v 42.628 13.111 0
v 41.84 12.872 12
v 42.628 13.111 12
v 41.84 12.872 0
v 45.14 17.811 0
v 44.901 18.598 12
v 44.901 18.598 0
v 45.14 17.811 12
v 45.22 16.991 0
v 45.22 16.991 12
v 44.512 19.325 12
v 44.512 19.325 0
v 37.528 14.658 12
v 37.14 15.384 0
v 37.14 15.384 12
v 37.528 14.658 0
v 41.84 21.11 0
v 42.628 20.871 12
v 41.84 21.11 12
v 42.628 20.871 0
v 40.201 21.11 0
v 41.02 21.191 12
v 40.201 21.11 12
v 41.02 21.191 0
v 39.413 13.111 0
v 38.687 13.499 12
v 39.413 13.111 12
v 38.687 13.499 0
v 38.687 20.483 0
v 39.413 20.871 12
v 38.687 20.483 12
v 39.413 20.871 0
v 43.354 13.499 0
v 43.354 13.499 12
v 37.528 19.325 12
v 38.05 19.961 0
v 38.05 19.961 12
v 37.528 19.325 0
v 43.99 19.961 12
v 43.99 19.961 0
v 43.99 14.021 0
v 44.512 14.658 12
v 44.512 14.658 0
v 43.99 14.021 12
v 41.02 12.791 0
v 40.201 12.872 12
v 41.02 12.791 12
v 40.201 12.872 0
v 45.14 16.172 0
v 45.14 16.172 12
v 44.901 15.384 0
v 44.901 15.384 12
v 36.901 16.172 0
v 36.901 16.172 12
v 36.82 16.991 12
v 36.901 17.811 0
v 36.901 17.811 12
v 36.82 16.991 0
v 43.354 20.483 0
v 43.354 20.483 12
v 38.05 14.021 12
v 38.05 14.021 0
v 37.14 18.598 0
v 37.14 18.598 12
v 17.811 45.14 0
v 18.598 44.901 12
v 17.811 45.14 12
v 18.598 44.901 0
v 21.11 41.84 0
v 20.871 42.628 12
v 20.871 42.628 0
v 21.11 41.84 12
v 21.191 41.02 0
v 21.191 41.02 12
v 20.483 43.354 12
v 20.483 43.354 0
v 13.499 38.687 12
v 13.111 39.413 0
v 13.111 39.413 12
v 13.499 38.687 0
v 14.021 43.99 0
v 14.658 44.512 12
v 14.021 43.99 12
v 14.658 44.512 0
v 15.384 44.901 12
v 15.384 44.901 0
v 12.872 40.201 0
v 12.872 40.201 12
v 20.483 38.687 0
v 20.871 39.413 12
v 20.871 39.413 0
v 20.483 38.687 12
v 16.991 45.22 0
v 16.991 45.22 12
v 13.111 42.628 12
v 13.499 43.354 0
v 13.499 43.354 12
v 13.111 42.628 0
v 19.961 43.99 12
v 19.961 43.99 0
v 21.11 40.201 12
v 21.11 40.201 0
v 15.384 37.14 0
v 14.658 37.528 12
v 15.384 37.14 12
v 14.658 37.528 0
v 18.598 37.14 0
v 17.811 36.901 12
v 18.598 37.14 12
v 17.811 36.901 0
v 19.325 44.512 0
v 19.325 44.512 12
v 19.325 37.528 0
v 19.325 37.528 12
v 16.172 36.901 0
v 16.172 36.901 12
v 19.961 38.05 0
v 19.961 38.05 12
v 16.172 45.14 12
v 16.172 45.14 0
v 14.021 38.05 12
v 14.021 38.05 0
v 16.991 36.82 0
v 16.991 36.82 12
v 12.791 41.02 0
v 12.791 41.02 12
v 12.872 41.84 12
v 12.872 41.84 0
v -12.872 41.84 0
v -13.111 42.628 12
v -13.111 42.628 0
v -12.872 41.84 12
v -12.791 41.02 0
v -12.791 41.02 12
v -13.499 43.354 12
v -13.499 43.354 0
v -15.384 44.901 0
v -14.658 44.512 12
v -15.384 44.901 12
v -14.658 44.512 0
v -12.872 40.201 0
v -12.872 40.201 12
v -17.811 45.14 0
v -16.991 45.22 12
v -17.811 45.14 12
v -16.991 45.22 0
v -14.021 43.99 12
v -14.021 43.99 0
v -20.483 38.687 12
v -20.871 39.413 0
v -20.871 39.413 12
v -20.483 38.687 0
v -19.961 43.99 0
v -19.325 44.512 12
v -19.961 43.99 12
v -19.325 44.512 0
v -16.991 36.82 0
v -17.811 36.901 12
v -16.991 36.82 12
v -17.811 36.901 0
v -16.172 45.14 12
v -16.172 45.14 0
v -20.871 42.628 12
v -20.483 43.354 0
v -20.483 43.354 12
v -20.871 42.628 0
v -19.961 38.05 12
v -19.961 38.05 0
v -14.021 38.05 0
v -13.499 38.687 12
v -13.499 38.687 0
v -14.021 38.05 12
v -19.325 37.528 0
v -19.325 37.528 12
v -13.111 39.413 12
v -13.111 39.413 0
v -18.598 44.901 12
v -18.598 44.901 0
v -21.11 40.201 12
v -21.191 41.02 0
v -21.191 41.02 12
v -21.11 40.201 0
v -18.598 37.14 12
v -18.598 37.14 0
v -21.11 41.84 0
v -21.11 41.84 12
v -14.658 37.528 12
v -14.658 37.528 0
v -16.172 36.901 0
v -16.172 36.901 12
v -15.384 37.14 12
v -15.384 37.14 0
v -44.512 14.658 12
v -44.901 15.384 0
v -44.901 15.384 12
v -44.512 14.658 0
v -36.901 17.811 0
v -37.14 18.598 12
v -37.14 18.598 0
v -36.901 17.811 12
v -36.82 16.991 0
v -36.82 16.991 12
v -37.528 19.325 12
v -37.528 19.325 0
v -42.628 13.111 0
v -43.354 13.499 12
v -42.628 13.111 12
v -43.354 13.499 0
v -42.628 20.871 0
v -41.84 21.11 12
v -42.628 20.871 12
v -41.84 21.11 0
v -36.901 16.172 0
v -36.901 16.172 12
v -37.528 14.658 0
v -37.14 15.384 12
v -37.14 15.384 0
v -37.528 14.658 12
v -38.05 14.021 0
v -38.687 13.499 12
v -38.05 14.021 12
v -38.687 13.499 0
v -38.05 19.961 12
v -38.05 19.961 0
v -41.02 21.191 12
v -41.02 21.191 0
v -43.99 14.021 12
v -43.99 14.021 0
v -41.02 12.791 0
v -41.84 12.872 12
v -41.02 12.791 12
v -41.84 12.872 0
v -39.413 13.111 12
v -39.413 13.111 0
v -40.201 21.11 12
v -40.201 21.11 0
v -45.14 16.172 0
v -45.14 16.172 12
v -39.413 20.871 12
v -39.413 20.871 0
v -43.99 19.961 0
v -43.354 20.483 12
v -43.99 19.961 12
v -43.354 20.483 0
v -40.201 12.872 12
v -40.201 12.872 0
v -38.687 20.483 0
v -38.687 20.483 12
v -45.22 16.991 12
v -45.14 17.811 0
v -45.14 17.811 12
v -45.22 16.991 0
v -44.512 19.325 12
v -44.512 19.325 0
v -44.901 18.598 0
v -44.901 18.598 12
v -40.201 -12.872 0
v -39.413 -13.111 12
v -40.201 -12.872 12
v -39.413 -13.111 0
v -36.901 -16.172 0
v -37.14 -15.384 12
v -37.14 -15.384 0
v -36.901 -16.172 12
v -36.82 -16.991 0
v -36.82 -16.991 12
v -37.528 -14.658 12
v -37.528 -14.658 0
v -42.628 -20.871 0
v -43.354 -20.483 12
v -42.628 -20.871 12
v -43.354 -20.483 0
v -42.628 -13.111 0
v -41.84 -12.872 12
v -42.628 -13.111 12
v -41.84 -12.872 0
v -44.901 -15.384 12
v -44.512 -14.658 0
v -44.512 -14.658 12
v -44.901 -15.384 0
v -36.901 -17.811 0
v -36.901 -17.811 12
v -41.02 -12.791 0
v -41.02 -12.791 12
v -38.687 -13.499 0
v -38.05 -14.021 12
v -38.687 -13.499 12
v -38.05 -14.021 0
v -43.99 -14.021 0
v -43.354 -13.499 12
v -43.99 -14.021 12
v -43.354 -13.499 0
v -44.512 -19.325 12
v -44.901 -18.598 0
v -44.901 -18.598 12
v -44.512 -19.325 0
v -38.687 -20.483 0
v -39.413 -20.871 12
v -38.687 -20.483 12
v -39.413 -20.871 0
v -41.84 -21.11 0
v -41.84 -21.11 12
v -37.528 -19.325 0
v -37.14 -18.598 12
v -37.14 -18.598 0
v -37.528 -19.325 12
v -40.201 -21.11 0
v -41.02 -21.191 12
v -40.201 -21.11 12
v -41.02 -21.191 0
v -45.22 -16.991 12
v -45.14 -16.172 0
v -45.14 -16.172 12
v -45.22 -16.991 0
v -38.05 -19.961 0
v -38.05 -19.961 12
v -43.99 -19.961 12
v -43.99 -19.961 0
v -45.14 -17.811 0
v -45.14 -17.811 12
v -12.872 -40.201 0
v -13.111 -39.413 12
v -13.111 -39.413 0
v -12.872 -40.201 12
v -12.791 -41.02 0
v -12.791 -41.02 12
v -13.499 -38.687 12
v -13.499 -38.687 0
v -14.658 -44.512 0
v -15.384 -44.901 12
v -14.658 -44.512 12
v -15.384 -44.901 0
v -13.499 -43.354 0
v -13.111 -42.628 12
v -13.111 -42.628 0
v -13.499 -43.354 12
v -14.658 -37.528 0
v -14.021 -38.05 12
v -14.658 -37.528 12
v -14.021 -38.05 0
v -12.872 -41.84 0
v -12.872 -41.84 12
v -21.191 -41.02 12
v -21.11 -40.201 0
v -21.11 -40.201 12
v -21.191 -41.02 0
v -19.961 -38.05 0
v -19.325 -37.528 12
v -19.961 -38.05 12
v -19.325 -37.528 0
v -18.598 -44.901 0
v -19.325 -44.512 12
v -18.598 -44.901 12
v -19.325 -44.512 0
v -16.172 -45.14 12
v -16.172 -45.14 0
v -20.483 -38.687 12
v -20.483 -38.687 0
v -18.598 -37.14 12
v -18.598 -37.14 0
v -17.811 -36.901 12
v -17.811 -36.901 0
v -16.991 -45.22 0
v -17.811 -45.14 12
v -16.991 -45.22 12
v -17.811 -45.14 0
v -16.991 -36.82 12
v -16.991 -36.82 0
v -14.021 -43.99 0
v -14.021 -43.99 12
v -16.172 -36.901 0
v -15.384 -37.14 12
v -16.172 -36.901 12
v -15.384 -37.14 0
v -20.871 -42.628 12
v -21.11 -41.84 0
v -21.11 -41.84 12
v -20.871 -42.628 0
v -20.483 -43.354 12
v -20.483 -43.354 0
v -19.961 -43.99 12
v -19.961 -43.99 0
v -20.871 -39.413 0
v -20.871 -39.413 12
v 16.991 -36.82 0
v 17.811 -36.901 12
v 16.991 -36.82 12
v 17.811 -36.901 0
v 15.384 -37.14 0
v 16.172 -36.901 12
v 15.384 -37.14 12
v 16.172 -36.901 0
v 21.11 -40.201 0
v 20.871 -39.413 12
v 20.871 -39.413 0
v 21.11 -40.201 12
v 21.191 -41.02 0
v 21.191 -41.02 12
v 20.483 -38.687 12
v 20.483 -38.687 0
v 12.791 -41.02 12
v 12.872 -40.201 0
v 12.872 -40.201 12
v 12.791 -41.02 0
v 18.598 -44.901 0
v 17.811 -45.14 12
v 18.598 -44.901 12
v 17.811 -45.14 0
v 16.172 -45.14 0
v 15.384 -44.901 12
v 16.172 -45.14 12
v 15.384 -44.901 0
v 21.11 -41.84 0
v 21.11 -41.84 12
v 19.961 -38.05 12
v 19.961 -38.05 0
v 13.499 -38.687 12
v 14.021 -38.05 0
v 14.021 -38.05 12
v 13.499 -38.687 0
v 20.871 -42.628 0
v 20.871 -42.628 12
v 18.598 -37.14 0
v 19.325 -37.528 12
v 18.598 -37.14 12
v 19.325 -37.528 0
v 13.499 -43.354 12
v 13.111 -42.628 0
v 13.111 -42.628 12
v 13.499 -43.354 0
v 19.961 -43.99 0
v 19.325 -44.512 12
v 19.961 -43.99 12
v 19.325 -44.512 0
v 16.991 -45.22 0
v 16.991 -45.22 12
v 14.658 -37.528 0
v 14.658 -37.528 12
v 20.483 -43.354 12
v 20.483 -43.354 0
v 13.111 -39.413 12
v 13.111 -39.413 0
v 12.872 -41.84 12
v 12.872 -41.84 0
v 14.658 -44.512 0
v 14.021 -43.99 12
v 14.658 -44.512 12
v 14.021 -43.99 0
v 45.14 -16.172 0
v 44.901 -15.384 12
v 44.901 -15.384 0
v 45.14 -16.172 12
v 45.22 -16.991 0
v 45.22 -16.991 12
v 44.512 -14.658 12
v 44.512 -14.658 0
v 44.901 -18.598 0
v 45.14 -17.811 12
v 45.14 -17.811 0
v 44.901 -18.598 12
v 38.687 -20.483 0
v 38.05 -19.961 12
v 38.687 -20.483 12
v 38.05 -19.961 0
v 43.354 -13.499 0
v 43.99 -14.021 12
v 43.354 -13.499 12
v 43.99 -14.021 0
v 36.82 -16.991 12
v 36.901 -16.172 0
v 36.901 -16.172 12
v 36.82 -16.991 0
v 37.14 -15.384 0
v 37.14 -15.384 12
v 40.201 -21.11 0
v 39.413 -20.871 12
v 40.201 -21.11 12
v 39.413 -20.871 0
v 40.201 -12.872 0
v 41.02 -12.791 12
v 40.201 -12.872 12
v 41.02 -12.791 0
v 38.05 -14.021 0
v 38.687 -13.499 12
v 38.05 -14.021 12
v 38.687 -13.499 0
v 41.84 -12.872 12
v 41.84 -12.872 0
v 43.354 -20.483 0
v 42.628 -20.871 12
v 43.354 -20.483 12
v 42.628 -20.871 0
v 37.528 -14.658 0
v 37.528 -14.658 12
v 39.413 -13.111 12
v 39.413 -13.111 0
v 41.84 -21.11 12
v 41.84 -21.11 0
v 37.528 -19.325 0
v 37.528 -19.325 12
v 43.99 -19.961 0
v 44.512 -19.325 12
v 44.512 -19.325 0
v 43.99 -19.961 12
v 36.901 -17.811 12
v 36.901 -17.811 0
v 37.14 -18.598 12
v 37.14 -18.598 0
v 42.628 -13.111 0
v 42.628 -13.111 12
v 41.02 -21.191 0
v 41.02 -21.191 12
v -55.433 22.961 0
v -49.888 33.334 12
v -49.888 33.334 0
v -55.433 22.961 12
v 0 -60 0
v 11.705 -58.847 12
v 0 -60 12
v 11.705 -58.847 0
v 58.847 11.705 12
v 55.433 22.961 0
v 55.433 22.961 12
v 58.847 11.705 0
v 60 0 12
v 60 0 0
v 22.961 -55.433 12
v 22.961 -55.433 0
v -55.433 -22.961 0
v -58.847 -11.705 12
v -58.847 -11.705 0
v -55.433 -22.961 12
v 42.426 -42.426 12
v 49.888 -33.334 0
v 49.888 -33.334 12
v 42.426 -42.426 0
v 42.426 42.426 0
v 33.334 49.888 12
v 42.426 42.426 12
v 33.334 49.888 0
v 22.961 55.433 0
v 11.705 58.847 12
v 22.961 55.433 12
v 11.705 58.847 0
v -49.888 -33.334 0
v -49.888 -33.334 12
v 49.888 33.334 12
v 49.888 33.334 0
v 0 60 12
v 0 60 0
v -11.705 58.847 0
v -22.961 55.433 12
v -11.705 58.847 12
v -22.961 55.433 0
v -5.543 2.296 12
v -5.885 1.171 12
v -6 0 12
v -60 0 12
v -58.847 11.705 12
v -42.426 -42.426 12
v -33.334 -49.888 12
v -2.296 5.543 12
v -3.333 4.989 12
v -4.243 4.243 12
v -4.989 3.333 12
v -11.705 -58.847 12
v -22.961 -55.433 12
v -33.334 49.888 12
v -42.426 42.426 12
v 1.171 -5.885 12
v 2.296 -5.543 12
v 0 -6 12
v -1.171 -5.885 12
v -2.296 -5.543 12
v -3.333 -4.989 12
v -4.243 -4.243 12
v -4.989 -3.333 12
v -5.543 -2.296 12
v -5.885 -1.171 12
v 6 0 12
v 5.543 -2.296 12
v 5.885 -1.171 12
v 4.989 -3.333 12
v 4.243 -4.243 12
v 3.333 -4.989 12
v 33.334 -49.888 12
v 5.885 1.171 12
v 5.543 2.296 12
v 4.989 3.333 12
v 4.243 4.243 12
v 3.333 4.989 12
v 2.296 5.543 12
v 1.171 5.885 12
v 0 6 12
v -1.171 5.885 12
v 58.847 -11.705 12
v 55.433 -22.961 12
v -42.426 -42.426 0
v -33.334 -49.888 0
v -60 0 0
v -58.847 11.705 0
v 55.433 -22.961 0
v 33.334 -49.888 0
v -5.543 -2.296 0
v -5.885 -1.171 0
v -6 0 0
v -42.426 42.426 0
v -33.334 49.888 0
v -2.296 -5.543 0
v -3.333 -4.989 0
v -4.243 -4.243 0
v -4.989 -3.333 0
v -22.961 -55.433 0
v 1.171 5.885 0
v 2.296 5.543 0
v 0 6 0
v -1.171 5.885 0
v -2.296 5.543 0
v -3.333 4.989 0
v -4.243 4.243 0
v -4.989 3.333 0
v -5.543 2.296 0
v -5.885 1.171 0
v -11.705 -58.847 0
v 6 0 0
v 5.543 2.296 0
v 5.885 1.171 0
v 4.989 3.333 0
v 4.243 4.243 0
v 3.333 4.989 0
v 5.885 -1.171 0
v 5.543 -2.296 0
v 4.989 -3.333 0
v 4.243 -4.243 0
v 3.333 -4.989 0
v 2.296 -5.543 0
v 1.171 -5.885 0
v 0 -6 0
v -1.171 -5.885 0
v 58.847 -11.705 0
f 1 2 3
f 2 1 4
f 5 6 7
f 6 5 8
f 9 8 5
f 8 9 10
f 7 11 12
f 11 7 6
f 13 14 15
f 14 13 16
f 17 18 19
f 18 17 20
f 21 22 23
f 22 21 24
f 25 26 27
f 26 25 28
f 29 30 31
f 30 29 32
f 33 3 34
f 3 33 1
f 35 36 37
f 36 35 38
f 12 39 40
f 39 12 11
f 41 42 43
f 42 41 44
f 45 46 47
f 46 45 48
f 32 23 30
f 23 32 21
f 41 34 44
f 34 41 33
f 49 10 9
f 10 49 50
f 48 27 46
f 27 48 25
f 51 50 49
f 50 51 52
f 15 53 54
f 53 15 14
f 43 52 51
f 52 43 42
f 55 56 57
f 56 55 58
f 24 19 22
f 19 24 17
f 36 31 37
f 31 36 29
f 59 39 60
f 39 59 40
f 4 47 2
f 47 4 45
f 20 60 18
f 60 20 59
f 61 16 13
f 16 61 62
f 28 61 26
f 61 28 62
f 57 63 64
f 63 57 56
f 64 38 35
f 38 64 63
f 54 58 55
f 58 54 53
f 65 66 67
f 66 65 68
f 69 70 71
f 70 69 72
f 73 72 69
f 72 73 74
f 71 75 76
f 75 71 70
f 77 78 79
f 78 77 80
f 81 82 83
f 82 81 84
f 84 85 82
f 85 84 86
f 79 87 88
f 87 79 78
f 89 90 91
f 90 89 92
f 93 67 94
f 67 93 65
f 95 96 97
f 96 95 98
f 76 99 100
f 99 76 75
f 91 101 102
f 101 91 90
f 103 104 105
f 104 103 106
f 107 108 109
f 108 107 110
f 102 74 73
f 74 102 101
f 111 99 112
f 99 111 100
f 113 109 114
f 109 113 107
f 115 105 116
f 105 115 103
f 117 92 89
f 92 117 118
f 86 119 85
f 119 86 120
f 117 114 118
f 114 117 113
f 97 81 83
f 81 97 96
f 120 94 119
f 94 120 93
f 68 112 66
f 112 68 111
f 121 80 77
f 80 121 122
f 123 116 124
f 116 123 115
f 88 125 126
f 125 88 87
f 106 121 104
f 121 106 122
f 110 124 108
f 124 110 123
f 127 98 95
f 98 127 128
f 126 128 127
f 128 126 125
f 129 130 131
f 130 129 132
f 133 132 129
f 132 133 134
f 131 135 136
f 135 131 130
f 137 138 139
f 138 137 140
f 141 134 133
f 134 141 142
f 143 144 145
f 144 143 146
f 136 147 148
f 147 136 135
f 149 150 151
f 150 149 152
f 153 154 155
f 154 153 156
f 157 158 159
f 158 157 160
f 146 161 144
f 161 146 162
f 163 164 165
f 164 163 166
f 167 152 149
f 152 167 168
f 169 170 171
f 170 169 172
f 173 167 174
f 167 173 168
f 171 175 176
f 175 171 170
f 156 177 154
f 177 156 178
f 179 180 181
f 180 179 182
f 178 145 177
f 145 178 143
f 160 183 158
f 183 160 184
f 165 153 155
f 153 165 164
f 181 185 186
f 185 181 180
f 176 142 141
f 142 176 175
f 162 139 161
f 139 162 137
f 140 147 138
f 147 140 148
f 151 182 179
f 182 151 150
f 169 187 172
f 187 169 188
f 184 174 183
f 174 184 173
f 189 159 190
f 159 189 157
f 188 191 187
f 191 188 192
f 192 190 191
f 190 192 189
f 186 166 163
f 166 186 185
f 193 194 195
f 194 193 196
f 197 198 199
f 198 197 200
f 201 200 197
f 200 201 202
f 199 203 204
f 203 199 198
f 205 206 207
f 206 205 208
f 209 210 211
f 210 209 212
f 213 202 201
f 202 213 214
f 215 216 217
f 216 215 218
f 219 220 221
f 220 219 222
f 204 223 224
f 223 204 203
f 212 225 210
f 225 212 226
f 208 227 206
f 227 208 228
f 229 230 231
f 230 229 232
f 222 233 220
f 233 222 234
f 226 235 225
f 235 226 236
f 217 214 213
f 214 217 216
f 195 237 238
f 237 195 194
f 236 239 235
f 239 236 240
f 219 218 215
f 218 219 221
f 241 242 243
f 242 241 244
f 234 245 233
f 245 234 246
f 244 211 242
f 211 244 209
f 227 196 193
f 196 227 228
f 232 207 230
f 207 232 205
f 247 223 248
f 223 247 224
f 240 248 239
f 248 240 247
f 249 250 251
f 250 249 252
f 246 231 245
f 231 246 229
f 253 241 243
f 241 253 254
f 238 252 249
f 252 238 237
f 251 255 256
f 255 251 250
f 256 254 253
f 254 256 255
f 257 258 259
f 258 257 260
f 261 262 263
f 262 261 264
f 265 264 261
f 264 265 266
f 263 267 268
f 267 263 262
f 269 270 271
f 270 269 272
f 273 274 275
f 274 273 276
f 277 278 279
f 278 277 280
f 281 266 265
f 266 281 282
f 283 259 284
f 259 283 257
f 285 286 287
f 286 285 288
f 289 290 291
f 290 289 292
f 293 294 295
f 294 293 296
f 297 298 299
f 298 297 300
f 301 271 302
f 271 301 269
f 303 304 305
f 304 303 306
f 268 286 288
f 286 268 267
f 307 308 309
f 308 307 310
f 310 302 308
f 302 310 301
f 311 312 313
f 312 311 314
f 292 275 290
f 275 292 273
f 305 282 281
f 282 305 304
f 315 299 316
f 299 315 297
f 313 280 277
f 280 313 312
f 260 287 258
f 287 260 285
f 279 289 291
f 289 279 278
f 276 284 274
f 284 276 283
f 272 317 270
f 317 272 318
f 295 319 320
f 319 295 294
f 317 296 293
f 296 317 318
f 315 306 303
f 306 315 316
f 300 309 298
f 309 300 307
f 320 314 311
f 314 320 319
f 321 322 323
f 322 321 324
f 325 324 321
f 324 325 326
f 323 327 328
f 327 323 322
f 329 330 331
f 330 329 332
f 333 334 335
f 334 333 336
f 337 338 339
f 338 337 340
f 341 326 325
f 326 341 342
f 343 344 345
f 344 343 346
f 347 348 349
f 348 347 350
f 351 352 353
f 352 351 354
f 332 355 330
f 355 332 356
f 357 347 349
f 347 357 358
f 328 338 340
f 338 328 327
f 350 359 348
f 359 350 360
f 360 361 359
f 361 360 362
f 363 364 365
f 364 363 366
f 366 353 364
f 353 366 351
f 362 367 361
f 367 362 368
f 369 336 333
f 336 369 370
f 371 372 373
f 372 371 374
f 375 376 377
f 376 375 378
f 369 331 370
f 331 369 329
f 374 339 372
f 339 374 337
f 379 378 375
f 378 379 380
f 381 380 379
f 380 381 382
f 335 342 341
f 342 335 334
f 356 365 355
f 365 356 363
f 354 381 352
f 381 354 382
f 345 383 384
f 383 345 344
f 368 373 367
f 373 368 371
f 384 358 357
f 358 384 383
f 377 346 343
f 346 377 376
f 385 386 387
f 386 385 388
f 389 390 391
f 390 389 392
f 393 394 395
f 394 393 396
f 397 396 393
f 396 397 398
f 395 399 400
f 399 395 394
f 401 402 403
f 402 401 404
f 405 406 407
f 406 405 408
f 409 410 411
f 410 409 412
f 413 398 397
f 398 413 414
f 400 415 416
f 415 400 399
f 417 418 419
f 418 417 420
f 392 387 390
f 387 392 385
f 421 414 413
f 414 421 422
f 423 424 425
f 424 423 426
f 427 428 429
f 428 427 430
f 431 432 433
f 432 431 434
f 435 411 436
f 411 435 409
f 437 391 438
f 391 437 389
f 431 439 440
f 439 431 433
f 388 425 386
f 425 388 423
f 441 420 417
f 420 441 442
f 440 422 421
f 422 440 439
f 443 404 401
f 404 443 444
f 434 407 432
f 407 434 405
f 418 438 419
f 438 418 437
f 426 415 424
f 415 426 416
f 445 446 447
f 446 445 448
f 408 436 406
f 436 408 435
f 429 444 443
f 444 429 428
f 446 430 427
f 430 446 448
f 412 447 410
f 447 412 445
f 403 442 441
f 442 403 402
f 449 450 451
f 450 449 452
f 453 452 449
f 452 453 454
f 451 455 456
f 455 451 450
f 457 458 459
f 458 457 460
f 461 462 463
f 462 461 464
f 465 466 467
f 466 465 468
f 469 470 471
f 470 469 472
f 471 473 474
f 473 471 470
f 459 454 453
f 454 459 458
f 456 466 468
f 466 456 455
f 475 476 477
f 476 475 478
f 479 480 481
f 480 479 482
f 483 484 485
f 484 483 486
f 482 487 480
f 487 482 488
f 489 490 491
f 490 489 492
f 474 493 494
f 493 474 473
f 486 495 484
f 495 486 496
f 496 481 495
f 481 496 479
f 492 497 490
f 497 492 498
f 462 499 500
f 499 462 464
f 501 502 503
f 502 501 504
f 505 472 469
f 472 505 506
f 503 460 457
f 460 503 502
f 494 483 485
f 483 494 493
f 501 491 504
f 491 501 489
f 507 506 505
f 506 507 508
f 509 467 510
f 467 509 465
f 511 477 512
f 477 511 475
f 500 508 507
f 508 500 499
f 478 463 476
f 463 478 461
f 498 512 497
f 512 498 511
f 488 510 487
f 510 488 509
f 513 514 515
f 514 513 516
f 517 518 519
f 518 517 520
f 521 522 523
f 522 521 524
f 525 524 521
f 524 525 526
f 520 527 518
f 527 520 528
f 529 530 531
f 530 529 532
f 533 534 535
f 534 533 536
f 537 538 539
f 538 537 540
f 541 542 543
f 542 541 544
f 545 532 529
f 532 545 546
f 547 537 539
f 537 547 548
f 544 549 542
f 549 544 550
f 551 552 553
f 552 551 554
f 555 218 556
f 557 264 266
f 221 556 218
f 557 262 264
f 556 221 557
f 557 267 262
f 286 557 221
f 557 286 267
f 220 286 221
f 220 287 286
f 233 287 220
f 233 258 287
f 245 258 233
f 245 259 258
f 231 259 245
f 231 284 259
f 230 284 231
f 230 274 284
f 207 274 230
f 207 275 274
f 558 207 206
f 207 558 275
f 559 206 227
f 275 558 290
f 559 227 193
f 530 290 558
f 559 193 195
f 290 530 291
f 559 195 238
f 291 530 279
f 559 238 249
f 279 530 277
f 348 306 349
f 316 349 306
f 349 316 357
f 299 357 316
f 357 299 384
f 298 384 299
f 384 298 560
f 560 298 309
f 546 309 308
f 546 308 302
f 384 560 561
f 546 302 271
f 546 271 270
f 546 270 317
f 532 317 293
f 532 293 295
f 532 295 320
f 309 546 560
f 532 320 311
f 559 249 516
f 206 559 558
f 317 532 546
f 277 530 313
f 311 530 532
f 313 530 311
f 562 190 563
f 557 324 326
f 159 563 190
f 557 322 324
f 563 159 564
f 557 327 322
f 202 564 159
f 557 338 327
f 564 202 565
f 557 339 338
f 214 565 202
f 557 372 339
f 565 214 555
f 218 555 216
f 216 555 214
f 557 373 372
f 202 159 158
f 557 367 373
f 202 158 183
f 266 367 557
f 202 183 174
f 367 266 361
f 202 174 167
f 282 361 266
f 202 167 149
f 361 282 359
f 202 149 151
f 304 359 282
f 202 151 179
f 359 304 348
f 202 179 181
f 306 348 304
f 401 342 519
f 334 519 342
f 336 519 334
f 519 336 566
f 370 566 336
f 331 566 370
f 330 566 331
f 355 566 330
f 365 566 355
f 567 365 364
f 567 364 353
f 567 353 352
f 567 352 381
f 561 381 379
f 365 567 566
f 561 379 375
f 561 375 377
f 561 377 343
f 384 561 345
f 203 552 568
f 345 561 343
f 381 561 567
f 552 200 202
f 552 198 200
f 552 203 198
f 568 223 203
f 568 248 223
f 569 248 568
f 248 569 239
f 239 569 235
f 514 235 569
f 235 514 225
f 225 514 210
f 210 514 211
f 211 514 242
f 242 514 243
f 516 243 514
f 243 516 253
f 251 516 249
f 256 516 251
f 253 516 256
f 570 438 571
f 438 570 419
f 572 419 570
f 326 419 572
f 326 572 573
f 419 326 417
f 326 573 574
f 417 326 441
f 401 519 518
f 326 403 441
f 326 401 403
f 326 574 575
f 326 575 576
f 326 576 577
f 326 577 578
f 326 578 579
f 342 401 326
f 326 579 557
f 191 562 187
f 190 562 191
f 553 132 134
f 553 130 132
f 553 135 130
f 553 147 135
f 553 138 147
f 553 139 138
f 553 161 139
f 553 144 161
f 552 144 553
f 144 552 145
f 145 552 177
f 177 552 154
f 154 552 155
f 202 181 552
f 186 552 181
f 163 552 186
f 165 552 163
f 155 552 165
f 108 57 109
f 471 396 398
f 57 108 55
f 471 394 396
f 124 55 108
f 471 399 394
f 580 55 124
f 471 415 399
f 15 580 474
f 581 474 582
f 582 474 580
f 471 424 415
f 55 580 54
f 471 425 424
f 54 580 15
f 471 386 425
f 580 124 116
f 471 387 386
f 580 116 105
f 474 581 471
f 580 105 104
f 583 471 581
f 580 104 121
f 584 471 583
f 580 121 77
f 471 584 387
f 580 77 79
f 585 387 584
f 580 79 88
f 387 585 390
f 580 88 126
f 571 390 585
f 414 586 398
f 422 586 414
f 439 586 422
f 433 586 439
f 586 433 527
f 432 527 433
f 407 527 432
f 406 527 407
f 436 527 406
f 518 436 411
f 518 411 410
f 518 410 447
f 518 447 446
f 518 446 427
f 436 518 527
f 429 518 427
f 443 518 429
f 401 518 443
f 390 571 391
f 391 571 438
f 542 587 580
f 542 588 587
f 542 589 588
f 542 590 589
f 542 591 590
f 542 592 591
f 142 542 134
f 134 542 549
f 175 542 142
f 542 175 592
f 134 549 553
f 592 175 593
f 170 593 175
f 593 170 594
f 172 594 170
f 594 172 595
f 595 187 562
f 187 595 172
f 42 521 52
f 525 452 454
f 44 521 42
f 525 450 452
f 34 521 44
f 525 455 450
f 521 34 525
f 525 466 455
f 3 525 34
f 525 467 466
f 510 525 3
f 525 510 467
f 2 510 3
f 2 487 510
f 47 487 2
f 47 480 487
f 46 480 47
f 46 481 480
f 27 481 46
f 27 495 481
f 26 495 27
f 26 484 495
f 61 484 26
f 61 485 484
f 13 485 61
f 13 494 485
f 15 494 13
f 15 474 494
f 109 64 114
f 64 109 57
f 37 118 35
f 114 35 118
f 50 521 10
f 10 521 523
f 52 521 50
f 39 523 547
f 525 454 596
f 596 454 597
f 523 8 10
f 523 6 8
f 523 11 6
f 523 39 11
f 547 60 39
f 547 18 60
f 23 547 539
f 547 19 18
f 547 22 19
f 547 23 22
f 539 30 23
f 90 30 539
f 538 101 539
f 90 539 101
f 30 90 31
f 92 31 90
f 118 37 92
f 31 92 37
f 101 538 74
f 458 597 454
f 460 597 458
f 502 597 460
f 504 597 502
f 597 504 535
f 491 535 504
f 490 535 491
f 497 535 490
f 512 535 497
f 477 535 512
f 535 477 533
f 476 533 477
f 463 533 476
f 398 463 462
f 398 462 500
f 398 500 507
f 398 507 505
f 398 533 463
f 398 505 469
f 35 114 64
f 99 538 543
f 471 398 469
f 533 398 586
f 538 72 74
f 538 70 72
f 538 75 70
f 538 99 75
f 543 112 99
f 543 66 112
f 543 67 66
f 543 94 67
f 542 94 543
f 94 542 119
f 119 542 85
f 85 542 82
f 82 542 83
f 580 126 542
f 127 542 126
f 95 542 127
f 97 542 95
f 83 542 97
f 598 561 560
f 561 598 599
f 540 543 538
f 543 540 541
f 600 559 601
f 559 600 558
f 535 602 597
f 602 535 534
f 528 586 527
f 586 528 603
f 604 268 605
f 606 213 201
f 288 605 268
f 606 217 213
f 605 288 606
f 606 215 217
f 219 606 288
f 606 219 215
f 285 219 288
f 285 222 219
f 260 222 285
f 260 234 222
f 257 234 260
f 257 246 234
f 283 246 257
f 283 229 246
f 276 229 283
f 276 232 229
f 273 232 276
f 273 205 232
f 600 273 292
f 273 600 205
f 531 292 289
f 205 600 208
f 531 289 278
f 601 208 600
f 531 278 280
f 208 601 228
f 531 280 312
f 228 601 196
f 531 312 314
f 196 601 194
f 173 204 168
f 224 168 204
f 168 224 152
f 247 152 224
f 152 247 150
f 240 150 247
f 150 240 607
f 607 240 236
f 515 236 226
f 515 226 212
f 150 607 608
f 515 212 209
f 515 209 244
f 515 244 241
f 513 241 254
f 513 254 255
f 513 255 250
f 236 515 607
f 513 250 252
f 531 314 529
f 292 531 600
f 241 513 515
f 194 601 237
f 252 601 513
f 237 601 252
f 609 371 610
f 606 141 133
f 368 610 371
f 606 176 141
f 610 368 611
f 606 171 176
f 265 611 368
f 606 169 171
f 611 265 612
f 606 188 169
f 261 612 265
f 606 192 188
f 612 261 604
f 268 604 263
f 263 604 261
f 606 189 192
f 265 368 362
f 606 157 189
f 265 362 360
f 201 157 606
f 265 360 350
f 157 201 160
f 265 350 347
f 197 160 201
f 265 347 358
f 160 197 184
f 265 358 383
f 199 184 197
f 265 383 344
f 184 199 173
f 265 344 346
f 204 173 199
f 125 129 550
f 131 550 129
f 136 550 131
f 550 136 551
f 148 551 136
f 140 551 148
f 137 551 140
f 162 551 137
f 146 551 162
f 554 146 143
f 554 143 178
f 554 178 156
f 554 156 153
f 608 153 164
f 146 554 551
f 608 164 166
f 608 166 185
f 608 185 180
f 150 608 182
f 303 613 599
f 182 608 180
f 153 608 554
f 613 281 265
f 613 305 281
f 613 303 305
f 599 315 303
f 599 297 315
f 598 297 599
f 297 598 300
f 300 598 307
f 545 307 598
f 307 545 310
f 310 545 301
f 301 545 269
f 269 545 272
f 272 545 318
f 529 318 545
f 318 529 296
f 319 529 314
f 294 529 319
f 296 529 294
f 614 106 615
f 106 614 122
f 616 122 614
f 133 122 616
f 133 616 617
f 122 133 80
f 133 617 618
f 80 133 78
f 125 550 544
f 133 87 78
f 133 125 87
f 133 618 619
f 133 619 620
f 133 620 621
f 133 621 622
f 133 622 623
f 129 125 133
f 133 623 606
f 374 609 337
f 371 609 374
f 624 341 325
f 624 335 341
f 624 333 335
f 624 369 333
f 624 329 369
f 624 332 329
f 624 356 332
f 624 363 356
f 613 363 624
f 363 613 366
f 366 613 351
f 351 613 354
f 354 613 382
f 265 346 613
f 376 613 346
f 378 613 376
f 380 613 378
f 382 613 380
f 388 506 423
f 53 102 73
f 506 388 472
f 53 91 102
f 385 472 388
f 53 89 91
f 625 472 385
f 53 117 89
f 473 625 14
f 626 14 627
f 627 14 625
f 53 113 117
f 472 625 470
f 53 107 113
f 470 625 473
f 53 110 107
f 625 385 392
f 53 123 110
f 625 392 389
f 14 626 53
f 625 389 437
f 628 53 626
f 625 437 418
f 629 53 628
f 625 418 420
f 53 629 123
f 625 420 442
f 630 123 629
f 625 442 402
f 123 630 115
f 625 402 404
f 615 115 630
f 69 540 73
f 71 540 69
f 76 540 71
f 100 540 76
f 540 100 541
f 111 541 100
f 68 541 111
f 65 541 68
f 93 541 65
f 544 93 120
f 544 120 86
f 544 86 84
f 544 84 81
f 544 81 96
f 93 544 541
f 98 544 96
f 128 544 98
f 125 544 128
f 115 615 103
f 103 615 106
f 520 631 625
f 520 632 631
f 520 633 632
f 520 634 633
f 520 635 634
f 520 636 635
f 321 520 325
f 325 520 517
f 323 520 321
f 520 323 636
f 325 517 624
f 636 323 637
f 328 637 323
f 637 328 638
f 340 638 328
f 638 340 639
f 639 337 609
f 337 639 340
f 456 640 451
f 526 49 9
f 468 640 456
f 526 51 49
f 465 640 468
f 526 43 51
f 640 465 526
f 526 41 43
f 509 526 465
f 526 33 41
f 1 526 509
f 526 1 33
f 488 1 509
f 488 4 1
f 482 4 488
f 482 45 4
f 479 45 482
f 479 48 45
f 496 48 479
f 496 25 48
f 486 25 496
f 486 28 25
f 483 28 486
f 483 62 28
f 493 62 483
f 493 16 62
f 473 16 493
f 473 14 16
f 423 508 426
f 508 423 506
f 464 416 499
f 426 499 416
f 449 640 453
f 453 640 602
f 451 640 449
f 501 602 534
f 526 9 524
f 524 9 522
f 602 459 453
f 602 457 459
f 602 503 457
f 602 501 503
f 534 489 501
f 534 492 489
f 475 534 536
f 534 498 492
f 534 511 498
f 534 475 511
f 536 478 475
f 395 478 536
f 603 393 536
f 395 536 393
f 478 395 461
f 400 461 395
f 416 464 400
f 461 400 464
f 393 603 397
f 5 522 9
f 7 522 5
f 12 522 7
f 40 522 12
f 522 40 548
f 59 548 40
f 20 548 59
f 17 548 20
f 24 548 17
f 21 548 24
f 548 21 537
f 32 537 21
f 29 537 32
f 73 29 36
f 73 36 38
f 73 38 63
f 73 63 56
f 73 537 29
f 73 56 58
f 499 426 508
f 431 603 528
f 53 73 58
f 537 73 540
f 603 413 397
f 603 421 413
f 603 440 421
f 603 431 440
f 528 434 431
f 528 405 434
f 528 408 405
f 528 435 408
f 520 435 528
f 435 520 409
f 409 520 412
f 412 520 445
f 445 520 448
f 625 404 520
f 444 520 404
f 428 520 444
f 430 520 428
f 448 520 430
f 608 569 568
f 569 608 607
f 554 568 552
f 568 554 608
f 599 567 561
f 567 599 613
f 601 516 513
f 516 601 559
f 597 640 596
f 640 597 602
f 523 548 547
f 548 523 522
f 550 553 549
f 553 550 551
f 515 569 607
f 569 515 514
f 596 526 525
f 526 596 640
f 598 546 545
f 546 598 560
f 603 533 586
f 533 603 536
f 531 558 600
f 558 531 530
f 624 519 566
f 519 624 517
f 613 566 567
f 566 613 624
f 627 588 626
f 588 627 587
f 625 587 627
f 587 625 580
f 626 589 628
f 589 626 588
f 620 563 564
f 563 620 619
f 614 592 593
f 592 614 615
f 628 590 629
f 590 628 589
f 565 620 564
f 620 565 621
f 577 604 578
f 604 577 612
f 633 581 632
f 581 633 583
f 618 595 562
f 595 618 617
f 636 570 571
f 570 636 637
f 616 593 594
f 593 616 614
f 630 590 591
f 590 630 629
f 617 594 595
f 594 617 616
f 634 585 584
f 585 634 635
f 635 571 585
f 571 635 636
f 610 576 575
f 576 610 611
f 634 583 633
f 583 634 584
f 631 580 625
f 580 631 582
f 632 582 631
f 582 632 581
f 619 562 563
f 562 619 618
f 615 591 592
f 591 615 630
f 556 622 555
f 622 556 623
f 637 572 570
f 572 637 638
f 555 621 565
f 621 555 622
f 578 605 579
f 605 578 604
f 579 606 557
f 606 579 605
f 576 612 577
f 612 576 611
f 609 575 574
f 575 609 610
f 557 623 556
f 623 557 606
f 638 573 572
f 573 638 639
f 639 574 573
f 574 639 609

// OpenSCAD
$fn = 32;

// ----------------------------------------------------------------------
// Flange Ø120 x 12
// 8 holes on a Ø88.8 bolt circle, bolted joints
// ----------------------------------------------------------------------

// --- parameters (mm) ---
flange_d = 120;    // outside diameter of the flange
thickness = 12;    // flange thickness
holes = 8;         // number of bolt holes
pcd = 88.8;        // bolt circle diameter
start_deg = 22.5;  // angle of the first hole, from +X
hole_d = 8.4;      // bolt hole diameter
bore_d = 12;       // central through bore
hub_d = 20;        // hub outside diameter
hub_h = 0;         // hub height above the flange face (0 = no hub)

// --- derived feature positions (mm) ---
height = thickness + hub_h;  // = 12   overall height of the part
pcd_r = pcd / 2;             // = 44.4   bolt circle radius
hole_step = 360 / holes;     // = 45   angular pitch
feature_centers = [
  [pcd_r * cos(start_deg + 0 * hole_step), pcd_r * sin(start_deg + 0 * hole_step)],
  [pcd_r * cos(start_deg + 1 * hole_step), pcd_r * sin(start_deg + 1 * hole_step)],
  [pcd_r * cos(start_deg + 2 * hole_step), pcd_r * sin(start_deg + 2 * hole_step)],
  [pcd_r * cos(start_deg + 3 * hole_step), pcd_r * sin(start_deg + 3 * hole_step)],
  [pcd_r * cos(start_deg + 4 * hole_step), pcd_r * sin(start_deg + 4 * hole_step)],
  [pcd_r * cos(start_deg + 5 * hole_step), pcd_r * sin(start_deg + 5 * hole_step)],
  [pcd_r * cos(start_deg + 6 * hole_step), pcd_r * sin(start_deg + 6 * hole_step)],
  [pcd_r * cos(start_deg + 7 * hole_step), pcd_r * sin(start_deg + 7 * hole_step)]
];   // bolt hole centres on the pitch circle

// flange disc, every hole and the bore cut straight through
difference() {
  union() {
    cylinder(d = flange_d, h = thickness);
  }
  translate([0, 0, -1]) cylinder(d = bore_d, h = height + 2);  // bore, through
  for (centre = feature_centers)
    translate([centre[0], centre[1], -1]) cylinder(d = hole_d, h = thickness + 2);
}
